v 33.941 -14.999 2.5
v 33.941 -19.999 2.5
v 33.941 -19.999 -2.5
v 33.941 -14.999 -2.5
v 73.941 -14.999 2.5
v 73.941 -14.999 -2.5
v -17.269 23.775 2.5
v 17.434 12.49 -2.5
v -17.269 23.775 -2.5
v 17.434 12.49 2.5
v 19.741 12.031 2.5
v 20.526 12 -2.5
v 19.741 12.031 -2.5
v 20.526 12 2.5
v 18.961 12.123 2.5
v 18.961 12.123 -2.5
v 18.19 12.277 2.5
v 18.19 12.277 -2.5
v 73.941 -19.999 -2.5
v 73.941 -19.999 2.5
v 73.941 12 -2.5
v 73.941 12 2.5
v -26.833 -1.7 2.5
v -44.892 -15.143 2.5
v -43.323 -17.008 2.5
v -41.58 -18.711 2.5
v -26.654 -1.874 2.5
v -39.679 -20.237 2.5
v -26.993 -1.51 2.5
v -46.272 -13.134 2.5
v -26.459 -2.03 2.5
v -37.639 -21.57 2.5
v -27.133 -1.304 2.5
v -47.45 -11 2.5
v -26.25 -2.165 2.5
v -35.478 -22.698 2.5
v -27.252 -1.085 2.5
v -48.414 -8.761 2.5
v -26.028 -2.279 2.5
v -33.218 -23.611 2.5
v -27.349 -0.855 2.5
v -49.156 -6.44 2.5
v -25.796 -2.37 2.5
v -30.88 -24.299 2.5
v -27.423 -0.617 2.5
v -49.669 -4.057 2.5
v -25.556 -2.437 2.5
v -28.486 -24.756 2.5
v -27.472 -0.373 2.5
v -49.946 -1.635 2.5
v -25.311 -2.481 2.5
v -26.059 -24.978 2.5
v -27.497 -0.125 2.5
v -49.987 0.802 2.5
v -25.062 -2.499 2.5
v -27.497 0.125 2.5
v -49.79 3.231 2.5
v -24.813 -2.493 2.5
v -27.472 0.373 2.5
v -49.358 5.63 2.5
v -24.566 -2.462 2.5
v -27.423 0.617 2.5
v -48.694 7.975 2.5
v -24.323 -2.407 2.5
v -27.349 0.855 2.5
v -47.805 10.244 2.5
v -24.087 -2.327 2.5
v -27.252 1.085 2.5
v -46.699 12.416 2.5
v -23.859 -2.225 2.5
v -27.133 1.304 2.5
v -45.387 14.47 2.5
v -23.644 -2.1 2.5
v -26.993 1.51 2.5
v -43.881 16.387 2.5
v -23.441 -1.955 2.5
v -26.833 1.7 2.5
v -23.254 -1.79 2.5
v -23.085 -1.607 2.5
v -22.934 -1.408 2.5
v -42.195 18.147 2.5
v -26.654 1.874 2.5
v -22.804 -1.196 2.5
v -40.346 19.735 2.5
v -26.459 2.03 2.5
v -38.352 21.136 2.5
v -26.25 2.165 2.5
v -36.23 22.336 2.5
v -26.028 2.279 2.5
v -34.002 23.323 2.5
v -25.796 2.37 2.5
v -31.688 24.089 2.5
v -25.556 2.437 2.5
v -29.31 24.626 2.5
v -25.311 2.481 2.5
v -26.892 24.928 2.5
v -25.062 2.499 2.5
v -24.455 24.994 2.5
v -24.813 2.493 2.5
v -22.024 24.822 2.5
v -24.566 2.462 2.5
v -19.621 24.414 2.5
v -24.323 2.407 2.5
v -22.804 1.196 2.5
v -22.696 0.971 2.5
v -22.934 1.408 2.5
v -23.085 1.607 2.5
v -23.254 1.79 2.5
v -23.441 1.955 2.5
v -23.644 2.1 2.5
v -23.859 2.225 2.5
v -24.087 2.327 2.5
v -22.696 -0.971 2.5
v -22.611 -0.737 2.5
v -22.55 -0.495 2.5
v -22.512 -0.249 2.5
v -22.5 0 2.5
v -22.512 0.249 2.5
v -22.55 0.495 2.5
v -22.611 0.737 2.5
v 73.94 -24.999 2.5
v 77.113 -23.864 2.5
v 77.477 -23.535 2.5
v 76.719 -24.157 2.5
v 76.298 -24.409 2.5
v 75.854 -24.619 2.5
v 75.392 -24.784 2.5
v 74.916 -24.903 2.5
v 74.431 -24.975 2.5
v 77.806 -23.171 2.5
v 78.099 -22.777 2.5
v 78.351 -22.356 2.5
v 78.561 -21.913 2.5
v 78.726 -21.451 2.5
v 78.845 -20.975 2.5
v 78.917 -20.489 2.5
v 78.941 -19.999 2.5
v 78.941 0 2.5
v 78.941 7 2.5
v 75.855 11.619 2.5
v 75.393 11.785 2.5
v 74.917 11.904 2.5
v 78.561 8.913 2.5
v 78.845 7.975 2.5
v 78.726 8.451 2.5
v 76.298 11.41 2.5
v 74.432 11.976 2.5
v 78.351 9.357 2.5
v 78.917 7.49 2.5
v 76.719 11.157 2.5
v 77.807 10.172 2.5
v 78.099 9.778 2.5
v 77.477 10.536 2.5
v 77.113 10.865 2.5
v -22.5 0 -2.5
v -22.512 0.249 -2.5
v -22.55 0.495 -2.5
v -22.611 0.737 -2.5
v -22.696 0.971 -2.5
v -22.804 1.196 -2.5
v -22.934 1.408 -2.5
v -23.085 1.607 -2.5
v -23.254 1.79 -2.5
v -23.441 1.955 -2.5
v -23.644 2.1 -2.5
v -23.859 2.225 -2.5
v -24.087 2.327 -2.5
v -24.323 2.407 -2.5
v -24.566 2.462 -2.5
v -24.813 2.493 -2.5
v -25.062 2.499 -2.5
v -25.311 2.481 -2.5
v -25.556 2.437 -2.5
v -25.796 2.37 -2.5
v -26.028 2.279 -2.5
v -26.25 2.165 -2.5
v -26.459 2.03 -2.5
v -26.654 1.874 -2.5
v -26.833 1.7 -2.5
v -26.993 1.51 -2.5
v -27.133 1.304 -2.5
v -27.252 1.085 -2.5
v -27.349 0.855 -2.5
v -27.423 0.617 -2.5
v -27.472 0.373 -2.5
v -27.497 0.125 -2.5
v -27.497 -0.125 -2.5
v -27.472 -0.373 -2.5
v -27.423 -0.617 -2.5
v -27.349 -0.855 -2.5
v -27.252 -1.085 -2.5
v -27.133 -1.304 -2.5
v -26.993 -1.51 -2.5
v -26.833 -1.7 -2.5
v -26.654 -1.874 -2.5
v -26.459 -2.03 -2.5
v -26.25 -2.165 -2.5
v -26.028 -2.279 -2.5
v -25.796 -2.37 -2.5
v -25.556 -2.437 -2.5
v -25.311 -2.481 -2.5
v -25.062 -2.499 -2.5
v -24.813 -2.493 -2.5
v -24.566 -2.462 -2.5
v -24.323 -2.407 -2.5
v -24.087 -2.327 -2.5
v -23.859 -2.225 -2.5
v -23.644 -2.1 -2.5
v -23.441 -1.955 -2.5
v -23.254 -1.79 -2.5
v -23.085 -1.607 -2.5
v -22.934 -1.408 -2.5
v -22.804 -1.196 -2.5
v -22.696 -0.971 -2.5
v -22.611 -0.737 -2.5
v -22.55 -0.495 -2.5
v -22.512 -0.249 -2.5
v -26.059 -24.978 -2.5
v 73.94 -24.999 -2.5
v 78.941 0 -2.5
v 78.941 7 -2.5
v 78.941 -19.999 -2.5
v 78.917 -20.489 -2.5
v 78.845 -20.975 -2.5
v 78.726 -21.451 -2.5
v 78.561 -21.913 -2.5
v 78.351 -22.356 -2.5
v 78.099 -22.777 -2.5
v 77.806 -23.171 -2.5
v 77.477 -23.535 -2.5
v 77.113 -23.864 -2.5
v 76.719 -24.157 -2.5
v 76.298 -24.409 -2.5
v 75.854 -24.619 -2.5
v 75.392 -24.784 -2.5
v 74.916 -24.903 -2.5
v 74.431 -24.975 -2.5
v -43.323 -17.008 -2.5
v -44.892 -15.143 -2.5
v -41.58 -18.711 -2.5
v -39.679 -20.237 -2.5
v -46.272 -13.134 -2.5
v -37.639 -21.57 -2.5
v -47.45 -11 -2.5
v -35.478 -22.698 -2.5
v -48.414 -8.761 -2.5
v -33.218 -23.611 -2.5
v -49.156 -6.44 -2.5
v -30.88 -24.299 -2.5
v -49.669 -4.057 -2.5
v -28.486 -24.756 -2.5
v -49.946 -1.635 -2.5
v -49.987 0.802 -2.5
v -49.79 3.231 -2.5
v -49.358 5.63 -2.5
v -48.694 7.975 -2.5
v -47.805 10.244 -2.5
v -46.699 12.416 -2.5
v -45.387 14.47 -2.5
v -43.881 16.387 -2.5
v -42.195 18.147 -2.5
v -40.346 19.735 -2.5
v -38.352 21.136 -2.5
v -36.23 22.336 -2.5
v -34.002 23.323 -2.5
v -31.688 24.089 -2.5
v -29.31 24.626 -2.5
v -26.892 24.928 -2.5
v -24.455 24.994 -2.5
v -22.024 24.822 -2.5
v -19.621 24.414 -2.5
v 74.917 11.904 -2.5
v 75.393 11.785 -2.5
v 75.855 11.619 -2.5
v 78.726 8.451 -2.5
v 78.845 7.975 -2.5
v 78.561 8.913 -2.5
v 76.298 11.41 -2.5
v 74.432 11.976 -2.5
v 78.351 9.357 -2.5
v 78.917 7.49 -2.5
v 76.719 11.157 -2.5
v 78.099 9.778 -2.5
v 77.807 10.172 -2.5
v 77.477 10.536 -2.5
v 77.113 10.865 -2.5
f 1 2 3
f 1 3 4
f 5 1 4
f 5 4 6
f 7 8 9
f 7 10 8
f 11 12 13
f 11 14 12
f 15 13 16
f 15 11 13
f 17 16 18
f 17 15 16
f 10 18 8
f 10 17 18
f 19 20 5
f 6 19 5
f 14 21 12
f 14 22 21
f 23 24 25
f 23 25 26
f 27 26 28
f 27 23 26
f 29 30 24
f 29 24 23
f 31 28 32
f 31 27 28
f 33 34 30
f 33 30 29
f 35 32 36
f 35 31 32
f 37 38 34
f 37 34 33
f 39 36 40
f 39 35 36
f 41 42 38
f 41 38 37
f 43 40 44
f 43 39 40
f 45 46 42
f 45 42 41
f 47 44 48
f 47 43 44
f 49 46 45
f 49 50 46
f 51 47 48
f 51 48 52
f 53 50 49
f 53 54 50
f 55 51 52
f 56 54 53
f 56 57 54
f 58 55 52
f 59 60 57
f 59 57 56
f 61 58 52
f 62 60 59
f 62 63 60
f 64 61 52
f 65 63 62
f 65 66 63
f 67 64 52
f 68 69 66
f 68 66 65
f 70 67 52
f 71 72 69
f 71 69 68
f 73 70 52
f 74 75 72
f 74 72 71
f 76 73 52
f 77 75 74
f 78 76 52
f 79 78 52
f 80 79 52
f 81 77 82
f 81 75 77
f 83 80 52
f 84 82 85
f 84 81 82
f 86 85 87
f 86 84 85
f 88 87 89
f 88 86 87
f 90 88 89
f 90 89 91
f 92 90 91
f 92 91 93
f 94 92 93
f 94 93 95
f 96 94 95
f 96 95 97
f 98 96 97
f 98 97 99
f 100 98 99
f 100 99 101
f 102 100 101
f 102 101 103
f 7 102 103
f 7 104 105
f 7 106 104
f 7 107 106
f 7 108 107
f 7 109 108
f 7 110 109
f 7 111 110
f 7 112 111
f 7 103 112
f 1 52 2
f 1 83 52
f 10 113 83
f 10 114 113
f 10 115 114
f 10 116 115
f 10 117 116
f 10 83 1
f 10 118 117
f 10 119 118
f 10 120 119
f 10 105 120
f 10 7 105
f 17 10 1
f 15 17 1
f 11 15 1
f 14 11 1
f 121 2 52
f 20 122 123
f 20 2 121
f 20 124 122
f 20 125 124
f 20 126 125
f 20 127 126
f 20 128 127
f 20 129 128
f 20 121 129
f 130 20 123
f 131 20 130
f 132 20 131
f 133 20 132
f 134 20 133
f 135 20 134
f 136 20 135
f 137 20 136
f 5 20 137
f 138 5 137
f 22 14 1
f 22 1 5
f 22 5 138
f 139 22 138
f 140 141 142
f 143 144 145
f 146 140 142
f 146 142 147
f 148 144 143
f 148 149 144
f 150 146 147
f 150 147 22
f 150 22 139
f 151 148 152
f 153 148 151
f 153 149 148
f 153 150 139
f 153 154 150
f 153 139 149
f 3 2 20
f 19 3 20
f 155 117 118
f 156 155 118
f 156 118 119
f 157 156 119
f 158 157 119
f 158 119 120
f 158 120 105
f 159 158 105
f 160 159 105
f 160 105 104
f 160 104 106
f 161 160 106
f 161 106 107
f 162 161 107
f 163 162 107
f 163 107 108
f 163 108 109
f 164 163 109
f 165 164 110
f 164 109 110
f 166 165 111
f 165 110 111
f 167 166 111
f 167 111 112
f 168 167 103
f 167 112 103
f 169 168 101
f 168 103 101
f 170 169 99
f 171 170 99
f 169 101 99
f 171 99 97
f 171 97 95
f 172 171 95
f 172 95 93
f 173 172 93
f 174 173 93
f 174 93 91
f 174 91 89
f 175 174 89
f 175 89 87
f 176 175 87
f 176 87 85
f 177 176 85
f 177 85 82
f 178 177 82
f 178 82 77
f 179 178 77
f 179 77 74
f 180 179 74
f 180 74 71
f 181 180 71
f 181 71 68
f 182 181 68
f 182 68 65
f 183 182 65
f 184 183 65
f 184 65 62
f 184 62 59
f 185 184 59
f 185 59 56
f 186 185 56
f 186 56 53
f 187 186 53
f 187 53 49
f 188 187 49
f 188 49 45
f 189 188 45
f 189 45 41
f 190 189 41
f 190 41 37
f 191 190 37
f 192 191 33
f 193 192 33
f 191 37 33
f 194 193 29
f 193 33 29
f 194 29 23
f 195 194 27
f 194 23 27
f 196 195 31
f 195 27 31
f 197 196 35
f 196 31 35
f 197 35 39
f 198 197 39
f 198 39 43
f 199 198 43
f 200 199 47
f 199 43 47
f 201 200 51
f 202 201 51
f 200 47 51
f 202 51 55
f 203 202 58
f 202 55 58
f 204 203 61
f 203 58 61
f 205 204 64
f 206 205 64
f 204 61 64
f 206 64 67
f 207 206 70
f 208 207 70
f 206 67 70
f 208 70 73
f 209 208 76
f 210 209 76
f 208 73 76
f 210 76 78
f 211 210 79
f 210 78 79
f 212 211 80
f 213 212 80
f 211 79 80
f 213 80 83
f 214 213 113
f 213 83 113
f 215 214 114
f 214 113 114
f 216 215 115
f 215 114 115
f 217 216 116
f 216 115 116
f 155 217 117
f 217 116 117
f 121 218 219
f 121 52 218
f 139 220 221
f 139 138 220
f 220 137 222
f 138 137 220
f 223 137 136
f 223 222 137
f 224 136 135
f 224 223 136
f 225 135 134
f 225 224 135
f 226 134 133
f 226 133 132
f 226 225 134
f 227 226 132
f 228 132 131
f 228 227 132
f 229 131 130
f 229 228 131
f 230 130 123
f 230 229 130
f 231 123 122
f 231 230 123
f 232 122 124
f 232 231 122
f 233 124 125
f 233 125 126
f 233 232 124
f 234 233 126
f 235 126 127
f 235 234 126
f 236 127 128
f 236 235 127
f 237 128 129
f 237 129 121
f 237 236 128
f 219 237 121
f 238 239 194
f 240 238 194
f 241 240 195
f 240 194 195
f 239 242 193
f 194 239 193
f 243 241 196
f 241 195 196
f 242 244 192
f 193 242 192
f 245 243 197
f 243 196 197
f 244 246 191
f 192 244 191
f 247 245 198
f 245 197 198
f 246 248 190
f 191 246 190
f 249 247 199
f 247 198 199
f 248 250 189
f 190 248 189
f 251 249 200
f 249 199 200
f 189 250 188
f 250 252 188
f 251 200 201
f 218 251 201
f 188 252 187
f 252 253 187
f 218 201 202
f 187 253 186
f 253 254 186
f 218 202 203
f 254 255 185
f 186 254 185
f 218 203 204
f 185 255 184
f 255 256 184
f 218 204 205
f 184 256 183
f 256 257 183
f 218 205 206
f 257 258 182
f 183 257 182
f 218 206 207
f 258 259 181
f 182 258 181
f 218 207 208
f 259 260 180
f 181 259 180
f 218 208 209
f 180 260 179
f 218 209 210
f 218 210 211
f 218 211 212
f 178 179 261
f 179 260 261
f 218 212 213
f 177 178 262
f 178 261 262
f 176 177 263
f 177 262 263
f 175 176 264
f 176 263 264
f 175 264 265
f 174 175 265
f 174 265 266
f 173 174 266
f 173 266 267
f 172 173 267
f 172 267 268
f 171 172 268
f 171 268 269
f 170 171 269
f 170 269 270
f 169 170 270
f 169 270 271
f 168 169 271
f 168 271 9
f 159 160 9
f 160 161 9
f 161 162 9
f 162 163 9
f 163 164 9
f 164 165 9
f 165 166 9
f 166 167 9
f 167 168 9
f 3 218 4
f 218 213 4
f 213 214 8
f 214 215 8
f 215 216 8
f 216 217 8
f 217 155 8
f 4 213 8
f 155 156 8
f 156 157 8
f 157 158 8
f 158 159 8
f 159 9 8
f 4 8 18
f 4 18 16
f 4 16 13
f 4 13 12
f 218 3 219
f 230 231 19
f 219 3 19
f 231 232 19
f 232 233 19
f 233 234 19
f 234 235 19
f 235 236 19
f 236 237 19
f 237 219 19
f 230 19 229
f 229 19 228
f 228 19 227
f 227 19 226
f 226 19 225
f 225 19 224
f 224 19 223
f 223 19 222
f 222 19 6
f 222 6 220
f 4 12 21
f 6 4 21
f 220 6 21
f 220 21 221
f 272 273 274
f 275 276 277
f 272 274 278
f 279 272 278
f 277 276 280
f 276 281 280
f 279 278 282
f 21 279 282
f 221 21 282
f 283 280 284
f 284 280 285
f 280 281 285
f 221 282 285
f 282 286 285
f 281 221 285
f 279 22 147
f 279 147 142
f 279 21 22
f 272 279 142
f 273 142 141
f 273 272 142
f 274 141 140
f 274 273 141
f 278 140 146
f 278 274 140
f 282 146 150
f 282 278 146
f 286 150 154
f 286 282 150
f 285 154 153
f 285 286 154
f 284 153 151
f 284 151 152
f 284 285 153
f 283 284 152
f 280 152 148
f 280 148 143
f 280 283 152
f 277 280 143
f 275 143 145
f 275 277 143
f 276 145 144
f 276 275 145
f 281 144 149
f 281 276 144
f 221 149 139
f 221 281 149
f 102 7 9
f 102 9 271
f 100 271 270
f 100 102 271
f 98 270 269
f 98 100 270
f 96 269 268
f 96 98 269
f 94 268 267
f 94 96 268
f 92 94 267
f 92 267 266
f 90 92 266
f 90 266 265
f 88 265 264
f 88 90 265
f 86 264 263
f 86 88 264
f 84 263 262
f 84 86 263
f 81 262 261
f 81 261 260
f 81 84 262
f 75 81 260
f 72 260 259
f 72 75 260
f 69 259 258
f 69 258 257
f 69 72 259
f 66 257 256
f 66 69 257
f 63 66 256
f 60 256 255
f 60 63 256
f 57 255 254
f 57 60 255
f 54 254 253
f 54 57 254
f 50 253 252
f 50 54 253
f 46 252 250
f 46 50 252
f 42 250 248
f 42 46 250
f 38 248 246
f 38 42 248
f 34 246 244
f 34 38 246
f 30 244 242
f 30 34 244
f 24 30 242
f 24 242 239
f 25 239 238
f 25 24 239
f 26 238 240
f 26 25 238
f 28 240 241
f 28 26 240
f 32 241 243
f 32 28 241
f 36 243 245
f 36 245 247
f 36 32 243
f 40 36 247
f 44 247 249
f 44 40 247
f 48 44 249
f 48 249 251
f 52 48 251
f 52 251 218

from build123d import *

# Parameters (mm, degrees)
EXTRUIR1_DEPTH = 2.5
REDONDEO1_R    = 10
CROQUIS2_R     = 2.5
EXTRUIR2_DEPTH = 10
REDONDEO2_R    = 5
CROQUIS4_W     = 40
CROQUIS4_H     = 5
EXTRUIR3_DEPTH = 10


with BuildPart() as part:
    # Croquis1 → Extruir1 (new, symmetric)
    with BuildSketch(Plane.XY):
        with BuildLine():
            Line((78.941483087, 11.999998301), (18.941483087, 11.999994988))
            Line((18.941483087, 11.999994988), (-17.269168309, 23.774653719))
            ThreePointArc((-17.269168309, 23.774653719), (-49.603355409, 4.435638782), (-26.058513909, -24.977582614))
            Line((-26.058513909, -24.977582614), (78.941483697, -25.000001699))
            Line((78.941483697, -25.000001699), (78.941483697, -1.699e-06))
            Line((78.941483697, -1.699e-06), (78.941483087, 11.999998301))
        make_face()
    extrude(amount=EXTRUIR1_DEPTH, both=True)

    # Redondeo1
    redondeo1_edges = [part.edges().sort_by_distance(p)[0] for p in [
        (18.941483087, 11.999994988, 0),
    ]]
    fillet(redondeo1_edges, radius=REDONDEO1_R)

    # Croquis2 → Extruir2 (cut)
    with BuildSketch(Plane.XY.offset(2.5)):
        with Locations((-25.000000078, -1.697e-06)):
            Circle(CROQUIS2_R)
    extrude(amount=-EXTRUIR2_DEPTH, mode=Mode.SUBTRACT)

    # Redondeo2
    redondeo2_edges = [part.edges().sort_by_distance(p)[0] for p in [
        (78.941483697, -25.000001699, 0),
        (78.941483087, 11.999998301, 0),
    ]]
    fillet(redondeo2_edges, radius=REDONDEO2_R)

    # Croquis4 → Extruir3 (cut)
    with BuildSketch(Plane.XY.offset(2.5)):
        with Locations((53.941483697, -17.498934009)):
            Rectangle(CROQUIS4_W, CROQUIS4_H)
    extrude(amount=-EXTRUIR3_DEPTH, mode=Mode.SUBTRACT)


solid = part.part
